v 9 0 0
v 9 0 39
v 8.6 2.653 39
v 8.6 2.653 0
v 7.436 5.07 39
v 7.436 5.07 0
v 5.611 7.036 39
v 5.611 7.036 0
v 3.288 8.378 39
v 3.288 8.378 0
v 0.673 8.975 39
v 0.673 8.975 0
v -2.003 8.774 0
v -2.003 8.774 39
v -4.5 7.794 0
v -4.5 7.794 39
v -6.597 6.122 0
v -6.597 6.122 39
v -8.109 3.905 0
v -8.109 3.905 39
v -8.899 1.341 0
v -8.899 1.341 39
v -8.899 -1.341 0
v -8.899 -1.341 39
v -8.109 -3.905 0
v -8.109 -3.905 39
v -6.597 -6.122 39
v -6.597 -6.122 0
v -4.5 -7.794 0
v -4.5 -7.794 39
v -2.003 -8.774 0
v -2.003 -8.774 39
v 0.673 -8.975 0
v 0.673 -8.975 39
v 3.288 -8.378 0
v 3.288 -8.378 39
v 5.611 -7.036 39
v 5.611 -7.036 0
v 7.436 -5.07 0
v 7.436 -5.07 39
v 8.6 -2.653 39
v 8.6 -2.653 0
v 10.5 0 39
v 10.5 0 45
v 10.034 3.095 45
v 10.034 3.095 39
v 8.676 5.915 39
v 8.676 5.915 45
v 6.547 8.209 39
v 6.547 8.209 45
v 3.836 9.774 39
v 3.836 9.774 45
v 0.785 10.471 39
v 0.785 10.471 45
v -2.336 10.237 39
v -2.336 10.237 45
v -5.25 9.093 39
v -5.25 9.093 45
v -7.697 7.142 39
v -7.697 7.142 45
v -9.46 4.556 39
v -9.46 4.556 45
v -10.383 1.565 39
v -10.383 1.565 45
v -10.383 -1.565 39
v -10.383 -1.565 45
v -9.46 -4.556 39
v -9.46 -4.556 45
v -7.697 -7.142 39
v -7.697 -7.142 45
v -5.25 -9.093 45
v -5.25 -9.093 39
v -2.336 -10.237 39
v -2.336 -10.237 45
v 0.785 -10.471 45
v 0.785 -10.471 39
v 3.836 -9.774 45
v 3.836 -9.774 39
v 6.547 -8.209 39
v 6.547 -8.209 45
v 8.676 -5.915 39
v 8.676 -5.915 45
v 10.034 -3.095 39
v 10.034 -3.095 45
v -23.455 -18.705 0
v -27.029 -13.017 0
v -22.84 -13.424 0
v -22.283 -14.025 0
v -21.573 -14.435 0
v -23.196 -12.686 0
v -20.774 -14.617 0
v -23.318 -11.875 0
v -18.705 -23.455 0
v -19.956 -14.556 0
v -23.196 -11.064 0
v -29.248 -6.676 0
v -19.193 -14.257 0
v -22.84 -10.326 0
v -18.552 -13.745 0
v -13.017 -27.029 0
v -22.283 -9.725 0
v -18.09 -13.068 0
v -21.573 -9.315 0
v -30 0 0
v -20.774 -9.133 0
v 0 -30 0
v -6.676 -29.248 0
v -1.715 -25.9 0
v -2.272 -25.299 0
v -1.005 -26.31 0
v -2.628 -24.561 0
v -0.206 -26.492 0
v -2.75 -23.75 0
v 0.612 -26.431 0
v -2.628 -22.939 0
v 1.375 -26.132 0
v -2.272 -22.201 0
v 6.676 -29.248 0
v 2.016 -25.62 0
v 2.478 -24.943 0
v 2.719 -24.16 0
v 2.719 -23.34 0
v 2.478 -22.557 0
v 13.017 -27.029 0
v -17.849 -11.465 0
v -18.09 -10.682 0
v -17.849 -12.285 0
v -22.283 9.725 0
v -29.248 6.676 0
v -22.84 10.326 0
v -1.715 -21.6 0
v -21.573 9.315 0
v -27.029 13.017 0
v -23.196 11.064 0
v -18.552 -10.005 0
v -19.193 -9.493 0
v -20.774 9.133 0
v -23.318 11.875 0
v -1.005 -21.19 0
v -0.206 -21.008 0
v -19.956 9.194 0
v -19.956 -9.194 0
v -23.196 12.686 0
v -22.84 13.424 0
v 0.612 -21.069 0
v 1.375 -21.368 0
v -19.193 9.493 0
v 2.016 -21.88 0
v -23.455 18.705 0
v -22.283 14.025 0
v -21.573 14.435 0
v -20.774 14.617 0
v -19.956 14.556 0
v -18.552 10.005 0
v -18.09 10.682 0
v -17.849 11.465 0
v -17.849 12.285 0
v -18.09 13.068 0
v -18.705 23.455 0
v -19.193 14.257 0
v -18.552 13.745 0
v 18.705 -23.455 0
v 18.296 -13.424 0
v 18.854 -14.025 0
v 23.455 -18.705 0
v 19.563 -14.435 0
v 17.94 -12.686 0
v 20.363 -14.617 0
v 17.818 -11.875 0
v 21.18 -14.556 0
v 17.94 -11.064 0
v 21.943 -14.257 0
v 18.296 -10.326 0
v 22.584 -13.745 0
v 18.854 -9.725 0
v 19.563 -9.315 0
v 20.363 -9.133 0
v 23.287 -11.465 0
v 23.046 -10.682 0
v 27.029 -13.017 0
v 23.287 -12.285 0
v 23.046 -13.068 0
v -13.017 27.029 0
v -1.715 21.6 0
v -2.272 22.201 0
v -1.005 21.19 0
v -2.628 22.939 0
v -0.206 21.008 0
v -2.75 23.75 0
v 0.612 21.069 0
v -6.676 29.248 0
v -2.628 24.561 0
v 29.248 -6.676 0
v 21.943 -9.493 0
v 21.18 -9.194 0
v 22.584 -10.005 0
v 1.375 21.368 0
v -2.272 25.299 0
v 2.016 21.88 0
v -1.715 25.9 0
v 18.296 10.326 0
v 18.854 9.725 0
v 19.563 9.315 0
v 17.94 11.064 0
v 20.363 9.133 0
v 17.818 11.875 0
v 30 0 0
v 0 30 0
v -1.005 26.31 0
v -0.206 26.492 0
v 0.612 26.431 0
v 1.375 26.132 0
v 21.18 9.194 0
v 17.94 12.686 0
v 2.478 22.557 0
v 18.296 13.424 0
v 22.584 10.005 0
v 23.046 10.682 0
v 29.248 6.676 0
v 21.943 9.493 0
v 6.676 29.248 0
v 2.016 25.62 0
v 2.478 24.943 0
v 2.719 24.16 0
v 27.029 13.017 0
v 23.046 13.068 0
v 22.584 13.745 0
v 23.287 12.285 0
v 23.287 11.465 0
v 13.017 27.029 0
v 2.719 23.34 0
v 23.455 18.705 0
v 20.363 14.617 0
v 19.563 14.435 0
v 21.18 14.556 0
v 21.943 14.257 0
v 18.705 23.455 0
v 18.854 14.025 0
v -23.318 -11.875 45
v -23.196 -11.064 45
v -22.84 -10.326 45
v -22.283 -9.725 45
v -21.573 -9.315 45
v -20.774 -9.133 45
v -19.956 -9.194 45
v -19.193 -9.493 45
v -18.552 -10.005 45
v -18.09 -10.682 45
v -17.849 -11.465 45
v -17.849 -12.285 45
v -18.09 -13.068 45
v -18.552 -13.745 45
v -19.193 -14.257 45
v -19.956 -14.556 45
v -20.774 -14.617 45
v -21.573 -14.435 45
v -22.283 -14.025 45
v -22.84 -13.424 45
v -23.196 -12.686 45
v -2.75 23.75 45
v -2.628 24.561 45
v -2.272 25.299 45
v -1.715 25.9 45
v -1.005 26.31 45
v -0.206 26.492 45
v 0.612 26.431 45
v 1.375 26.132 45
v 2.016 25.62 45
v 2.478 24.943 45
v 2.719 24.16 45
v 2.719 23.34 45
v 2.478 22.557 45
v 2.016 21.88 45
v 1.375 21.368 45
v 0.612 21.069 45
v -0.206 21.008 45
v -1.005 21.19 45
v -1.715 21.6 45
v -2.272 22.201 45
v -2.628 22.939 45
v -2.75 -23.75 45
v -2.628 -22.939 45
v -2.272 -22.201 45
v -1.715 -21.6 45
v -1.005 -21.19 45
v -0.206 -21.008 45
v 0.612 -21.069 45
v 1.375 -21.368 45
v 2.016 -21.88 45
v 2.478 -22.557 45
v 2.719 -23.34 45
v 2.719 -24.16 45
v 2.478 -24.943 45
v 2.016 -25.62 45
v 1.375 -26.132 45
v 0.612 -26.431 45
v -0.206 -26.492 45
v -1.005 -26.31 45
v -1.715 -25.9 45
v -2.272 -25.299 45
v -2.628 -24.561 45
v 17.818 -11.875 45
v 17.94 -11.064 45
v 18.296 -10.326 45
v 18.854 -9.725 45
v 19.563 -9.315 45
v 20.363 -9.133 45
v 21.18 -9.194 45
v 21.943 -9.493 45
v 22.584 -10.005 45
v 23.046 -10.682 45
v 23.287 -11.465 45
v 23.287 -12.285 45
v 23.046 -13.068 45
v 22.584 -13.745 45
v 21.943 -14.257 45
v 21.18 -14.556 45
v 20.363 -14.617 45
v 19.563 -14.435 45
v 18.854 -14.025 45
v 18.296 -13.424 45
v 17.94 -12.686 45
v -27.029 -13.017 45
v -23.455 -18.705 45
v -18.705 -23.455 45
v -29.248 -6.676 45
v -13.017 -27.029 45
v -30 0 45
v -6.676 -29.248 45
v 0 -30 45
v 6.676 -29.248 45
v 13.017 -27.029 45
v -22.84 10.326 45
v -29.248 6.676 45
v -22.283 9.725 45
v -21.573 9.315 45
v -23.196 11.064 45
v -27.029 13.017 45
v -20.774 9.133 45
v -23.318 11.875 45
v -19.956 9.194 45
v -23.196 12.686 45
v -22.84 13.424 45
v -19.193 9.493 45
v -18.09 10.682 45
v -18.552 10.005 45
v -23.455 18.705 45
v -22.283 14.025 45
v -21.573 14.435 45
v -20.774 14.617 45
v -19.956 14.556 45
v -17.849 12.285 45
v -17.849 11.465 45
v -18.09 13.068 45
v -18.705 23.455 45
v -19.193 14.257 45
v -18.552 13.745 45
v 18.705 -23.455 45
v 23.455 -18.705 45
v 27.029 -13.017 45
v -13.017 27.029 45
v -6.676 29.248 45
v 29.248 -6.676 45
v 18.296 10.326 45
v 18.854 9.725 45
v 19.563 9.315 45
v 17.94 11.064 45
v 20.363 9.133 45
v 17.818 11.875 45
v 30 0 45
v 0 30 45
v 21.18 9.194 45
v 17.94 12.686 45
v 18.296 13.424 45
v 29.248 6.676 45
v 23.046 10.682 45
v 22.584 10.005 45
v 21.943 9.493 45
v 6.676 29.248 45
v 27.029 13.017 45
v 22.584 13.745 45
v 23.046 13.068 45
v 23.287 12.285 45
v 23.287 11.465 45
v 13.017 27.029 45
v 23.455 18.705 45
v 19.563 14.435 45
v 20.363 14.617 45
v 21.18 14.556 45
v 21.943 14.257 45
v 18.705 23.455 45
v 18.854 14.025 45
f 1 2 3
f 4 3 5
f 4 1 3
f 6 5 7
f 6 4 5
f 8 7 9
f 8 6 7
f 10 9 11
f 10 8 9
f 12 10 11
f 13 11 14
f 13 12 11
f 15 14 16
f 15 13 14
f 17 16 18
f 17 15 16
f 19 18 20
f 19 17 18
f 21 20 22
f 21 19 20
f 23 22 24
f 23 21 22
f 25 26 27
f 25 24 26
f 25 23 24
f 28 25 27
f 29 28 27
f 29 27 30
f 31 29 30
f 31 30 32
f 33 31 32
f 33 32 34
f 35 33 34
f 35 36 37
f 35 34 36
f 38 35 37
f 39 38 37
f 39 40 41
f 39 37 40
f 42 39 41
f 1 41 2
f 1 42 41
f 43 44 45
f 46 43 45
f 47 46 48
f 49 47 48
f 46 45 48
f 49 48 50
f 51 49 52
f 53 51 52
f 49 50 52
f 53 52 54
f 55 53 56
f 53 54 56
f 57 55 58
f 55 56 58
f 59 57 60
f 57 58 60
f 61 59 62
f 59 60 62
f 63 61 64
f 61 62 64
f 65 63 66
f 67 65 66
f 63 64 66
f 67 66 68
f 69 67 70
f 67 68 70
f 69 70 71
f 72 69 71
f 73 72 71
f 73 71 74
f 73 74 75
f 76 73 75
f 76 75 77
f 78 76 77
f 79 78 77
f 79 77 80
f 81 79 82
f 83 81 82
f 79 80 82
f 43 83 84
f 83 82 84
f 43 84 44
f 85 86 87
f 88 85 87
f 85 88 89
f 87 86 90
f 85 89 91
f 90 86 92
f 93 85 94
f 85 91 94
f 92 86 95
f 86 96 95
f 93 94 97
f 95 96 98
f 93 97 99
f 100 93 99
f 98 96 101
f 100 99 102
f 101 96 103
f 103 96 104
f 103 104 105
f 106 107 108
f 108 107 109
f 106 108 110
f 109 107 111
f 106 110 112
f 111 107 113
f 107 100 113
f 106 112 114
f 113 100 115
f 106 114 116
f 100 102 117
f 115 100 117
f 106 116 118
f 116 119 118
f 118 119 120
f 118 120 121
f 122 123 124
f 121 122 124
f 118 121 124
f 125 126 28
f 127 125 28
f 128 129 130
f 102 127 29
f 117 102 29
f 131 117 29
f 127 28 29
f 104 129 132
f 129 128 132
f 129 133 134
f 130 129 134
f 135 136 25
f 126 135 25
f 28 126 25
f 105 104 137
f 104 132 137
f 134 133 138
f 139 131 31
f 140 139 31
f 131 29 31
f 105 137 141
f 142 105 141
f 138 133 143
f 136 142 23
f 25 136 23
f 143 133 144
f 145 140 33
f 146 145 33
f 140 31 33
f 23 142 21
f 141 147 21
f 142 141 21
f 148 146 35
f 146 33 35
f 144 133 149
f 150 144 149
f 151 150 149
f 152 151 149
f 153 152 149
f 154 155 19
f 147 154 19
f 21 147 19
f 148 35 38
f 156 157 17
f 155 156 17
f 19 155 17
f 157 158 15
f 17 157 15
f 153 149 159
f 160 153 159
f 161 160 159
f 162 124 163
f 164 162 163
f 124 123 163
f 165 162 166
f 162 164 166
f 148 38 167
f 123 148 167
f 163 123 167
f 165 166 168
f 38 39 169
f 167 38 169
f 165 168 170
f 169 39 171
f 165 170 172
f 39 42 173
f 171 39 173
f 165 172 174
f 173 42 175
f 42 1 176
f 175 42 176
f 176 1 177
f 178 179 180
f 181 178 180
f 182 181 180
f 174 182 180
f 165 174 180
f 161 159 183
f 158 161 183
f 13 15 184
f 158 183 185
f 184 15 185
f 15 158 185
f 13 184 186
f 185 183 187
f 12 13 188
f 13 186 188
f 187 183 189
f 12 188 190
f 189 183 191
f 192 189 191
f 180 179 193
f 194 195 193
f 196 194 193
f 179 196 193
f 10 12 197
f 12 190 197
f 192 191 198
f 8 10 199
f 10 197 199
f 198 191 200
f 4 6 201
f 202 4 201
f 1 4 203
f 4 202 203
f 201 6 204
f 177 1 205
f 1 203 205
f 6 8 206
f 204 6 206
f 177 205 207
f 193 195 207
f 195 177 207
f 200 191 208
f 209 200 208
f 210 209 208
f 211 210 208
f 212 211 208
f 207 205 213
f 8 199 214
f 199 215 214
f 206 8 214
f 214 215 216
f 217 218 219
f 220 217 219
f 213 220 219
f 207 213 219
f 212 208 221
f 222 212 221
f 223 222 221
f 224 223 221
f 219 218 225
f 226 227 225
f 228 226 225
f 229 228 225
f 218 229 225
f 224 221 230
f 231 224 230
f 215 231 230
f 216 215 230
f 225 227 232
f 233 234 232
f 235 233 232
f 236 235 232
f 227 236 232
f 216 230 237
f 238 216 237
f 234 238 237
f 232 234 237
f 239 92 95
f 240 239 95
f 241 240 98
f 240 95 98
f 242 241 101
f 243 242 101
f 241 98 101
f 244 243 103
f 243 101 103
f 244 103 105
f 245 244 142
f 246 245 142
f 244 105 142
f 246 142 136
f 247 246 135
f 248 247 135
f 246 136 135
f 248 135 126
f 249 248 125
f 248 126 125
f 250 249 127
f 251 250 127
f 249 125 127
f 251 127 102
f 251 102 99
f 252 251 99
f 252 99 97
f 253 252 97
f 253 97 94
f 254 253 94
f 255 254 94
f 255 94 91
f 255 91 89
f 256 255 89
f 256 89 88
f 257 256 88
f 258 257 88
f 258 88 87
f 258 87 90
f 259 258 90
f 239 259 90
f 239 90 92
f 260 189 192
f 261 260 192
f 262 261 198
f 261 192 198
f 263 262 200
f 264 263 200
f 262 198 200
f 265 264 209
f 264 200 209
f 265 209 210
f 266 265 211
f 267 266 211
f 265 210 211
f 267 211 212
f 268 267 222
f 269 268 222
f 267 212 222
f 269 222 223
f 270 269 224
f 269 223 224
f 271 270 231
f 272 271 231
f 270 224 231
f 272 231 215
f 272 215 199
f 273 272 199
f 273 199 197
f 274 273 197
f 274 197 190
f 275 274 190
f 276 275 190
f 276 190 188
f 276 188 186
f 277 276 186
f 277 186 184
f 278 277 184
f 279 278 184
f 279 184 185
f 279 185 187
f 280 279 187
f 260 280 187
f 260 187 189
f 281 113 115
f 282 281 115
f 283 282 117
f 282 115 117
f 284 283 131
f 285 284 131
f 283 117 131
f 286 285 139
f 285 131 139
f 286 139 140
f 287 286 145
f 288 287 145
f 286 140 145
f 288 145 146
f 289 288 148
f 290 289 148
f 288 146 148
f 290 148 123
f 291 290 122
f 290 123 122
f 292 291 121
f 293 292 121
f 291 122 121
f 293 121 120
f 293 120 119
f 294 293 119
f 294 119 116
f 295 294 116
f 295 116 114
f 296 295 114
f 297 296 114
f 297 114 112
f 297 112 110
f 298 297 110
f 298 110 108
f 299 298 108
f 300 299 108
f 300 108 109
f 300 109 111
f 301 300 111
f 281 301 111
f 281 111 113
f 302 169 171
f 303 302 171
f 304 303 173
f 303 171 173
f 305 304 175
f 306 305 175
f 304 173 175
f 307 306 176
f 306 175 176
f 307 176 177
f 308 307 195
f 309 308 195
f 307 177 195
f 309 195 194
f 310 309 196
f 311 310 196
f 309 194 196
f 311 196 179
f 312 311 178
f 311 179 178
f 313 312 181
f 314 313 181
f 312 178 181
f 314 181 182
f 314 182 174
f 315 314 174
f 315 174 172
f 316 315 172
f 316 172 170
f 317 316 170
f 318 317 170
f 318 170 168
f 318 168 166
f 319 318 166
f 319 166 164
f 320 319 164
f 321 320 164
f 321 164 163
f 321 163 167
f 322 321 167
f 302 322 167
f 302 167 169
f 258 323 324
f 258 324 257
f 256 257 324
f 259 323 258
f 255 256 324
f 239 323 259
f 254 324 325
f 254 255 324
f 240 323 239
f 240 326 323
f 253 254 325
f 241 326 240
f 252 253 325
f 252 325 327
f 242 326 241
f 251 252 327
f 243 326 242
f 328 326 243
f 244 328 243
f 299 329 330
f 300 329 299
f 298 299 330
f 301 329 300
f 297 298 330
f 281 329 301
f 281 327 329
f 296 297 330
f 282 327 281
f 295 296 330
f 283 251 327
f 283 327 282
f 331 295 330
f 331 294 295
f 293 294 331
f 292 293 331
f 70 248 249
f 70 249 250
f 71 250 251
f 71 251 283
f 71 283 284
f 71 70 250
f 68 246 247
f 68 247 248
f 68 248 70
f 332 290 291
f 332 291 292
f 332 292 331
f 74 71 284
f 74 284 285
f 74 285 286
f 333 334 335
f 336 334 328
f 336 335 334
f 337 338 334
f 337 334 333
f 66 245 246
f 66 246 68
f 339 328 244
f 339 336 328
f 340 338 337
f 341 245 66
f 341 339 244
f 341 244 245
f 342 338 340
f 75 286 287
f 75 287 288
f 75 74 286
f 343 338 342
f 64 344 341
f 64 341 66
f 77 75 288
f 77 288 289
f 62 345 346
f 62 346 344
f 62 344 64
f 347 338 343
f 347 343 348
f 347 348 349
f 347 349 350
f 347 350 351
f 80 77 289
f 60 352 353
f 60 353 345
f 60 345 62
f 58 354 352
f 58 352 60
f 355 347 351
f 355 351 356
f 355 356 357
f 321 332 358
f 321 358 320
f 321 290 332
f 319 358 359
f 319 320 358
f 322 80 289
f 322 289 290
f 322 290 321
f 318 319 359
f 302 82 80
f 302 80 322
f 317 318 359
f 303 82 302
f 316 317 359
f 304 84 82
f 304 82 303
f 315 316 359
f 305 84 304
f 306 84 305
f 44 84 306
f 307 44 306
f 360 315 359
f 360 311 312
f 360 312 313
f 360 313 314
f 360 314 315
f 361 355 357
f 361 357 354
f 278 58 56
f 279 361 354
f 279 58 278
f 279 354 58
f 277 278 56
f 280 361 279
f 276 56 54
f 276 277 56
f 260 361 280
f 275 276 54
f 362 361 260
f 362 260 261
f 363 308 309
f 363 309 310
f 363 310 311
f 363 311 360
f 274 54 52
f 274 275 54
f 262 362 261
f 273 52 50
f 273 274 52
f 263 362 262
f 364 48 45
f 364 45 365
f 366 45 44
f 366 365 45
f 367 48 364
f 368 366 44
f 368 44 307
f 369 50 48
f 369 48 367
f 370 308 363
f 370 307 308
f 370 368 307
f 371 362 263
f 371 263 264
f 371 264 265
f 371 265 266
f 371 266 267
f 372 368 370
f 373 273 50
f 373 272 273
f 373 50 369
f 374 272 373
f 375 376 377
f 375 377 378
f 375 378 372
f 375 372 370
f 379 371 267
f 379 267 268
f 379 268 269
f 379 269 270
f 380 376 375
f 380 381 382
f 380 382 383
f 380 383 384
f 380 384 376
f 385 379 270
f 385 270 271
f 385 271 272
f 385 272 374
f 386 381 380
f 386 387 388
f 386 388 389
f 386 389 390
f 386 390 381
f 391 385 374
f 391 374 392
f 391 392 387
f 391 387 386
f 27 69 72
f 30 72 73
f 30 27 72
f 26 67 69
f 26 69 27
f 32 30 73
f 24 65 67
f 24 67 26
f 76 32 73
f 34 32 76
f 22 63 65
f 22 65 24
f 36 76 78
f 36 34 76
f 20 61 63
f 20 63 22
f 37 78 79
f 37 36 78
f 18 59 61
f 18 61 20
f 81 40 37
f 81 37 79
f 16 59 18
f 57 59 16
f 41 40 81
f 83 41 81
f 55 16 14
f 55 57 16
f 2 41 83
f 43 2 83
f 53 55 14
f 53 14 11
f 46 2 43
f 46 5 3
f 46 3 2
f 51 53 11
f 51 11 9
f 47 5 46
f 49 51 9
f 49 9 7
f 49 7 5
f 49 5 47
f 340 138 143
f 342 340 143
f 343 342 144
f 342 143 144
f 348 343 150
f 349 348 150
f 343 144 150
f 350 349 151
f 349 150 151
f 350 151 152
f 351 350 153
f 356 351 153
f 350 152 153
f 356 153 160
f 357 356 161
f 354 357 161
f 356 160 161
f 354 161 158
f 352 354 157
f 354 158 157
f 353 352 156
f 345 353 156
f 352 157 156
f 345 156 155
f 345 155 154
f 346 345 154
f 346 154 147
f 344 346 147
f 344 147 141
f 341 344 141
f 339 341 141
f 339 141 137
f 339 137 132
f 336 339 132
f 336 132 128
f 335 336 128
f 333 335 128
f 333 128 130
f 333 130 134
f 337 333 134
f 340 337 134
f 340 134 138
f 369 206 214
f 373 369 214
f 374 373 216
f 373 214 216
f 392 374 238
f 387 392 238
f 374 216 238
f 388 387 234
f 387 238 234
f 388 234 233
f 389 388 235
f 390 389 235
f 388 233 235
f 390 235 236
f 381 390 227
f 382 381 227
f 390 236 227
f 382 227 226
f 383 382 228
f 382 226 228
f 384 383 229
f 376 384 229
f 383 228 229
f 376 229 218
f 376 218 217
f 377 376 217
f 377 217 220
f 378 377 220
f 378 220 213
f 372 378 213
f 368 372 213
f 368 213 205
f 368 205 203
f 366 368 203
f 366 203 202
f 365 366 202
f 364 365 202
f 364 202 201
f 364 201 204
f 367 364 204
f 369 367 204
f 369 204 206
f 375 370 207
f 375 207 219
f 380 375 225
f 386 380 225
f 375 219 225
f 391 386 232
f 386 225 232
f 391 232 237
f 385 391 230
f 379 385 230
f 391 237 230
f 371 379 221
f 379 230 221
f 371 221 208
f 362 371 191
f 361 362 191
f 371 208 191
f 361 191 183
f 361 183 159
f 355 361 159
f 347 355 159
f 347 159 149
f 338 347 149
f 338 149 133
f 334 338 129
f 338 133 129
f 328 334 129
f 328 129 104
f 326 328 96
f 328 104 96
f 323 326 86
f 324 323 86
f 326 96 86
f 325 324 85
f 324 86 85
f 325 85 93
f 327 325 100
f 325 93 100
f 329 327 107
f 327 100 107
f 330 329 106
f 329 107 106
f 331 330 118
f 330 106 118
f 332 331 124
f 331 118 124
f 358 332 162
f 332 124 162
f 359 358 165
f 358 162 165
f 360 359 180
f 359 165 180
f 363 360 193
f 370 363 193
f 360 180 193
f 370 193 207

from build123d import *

# Parameters (mm, degrees)
SKETCH1_R            = 30
SKETCH1_R_2          = 9
BOSS_EXTRUDE1_DEPTH  = 45
M5_CLEARANCE_HOLE1_D = 5.5
SKETCH4_R            = 10.5
CUT_EXTRUDE1_DEPTH   = 6


with BuildPart() as part:
    # Sketch1 → Boss-Extrude1 (new body)
    with BuildSketch(Plane.XY):
        Circle(SKETCH1_R)
        Circle(SKETCH1_R_2, mode=Mode.SUBTRACT)
    extrude(amount=BOSS_EXTRUDE1_DEPTH)

    # M5 Clearance Hole1 (through all)
    with Locations(Plane.XY.offset(45)):
        with Locations((0, 23.75), (20.56810334, 11.875), (20.56810334, -11.875), (0, -23.75), (-20.56810334, -11.875), (-20.56810334, 11.875), (0, 0)):
            Hole(M5_CLEARANCE_HOLE1_D / 2)

    # Sketch4 → Cut-Extrude1 (cut)
    with BuildSketch(Plane.XY.offset(45)):
        Circle(SKETCH4_R)
    extrude(amount=-CUT_EXTRUDE1_DEPTH, mode=Mode.SUBTRACT)


solid = part.part
